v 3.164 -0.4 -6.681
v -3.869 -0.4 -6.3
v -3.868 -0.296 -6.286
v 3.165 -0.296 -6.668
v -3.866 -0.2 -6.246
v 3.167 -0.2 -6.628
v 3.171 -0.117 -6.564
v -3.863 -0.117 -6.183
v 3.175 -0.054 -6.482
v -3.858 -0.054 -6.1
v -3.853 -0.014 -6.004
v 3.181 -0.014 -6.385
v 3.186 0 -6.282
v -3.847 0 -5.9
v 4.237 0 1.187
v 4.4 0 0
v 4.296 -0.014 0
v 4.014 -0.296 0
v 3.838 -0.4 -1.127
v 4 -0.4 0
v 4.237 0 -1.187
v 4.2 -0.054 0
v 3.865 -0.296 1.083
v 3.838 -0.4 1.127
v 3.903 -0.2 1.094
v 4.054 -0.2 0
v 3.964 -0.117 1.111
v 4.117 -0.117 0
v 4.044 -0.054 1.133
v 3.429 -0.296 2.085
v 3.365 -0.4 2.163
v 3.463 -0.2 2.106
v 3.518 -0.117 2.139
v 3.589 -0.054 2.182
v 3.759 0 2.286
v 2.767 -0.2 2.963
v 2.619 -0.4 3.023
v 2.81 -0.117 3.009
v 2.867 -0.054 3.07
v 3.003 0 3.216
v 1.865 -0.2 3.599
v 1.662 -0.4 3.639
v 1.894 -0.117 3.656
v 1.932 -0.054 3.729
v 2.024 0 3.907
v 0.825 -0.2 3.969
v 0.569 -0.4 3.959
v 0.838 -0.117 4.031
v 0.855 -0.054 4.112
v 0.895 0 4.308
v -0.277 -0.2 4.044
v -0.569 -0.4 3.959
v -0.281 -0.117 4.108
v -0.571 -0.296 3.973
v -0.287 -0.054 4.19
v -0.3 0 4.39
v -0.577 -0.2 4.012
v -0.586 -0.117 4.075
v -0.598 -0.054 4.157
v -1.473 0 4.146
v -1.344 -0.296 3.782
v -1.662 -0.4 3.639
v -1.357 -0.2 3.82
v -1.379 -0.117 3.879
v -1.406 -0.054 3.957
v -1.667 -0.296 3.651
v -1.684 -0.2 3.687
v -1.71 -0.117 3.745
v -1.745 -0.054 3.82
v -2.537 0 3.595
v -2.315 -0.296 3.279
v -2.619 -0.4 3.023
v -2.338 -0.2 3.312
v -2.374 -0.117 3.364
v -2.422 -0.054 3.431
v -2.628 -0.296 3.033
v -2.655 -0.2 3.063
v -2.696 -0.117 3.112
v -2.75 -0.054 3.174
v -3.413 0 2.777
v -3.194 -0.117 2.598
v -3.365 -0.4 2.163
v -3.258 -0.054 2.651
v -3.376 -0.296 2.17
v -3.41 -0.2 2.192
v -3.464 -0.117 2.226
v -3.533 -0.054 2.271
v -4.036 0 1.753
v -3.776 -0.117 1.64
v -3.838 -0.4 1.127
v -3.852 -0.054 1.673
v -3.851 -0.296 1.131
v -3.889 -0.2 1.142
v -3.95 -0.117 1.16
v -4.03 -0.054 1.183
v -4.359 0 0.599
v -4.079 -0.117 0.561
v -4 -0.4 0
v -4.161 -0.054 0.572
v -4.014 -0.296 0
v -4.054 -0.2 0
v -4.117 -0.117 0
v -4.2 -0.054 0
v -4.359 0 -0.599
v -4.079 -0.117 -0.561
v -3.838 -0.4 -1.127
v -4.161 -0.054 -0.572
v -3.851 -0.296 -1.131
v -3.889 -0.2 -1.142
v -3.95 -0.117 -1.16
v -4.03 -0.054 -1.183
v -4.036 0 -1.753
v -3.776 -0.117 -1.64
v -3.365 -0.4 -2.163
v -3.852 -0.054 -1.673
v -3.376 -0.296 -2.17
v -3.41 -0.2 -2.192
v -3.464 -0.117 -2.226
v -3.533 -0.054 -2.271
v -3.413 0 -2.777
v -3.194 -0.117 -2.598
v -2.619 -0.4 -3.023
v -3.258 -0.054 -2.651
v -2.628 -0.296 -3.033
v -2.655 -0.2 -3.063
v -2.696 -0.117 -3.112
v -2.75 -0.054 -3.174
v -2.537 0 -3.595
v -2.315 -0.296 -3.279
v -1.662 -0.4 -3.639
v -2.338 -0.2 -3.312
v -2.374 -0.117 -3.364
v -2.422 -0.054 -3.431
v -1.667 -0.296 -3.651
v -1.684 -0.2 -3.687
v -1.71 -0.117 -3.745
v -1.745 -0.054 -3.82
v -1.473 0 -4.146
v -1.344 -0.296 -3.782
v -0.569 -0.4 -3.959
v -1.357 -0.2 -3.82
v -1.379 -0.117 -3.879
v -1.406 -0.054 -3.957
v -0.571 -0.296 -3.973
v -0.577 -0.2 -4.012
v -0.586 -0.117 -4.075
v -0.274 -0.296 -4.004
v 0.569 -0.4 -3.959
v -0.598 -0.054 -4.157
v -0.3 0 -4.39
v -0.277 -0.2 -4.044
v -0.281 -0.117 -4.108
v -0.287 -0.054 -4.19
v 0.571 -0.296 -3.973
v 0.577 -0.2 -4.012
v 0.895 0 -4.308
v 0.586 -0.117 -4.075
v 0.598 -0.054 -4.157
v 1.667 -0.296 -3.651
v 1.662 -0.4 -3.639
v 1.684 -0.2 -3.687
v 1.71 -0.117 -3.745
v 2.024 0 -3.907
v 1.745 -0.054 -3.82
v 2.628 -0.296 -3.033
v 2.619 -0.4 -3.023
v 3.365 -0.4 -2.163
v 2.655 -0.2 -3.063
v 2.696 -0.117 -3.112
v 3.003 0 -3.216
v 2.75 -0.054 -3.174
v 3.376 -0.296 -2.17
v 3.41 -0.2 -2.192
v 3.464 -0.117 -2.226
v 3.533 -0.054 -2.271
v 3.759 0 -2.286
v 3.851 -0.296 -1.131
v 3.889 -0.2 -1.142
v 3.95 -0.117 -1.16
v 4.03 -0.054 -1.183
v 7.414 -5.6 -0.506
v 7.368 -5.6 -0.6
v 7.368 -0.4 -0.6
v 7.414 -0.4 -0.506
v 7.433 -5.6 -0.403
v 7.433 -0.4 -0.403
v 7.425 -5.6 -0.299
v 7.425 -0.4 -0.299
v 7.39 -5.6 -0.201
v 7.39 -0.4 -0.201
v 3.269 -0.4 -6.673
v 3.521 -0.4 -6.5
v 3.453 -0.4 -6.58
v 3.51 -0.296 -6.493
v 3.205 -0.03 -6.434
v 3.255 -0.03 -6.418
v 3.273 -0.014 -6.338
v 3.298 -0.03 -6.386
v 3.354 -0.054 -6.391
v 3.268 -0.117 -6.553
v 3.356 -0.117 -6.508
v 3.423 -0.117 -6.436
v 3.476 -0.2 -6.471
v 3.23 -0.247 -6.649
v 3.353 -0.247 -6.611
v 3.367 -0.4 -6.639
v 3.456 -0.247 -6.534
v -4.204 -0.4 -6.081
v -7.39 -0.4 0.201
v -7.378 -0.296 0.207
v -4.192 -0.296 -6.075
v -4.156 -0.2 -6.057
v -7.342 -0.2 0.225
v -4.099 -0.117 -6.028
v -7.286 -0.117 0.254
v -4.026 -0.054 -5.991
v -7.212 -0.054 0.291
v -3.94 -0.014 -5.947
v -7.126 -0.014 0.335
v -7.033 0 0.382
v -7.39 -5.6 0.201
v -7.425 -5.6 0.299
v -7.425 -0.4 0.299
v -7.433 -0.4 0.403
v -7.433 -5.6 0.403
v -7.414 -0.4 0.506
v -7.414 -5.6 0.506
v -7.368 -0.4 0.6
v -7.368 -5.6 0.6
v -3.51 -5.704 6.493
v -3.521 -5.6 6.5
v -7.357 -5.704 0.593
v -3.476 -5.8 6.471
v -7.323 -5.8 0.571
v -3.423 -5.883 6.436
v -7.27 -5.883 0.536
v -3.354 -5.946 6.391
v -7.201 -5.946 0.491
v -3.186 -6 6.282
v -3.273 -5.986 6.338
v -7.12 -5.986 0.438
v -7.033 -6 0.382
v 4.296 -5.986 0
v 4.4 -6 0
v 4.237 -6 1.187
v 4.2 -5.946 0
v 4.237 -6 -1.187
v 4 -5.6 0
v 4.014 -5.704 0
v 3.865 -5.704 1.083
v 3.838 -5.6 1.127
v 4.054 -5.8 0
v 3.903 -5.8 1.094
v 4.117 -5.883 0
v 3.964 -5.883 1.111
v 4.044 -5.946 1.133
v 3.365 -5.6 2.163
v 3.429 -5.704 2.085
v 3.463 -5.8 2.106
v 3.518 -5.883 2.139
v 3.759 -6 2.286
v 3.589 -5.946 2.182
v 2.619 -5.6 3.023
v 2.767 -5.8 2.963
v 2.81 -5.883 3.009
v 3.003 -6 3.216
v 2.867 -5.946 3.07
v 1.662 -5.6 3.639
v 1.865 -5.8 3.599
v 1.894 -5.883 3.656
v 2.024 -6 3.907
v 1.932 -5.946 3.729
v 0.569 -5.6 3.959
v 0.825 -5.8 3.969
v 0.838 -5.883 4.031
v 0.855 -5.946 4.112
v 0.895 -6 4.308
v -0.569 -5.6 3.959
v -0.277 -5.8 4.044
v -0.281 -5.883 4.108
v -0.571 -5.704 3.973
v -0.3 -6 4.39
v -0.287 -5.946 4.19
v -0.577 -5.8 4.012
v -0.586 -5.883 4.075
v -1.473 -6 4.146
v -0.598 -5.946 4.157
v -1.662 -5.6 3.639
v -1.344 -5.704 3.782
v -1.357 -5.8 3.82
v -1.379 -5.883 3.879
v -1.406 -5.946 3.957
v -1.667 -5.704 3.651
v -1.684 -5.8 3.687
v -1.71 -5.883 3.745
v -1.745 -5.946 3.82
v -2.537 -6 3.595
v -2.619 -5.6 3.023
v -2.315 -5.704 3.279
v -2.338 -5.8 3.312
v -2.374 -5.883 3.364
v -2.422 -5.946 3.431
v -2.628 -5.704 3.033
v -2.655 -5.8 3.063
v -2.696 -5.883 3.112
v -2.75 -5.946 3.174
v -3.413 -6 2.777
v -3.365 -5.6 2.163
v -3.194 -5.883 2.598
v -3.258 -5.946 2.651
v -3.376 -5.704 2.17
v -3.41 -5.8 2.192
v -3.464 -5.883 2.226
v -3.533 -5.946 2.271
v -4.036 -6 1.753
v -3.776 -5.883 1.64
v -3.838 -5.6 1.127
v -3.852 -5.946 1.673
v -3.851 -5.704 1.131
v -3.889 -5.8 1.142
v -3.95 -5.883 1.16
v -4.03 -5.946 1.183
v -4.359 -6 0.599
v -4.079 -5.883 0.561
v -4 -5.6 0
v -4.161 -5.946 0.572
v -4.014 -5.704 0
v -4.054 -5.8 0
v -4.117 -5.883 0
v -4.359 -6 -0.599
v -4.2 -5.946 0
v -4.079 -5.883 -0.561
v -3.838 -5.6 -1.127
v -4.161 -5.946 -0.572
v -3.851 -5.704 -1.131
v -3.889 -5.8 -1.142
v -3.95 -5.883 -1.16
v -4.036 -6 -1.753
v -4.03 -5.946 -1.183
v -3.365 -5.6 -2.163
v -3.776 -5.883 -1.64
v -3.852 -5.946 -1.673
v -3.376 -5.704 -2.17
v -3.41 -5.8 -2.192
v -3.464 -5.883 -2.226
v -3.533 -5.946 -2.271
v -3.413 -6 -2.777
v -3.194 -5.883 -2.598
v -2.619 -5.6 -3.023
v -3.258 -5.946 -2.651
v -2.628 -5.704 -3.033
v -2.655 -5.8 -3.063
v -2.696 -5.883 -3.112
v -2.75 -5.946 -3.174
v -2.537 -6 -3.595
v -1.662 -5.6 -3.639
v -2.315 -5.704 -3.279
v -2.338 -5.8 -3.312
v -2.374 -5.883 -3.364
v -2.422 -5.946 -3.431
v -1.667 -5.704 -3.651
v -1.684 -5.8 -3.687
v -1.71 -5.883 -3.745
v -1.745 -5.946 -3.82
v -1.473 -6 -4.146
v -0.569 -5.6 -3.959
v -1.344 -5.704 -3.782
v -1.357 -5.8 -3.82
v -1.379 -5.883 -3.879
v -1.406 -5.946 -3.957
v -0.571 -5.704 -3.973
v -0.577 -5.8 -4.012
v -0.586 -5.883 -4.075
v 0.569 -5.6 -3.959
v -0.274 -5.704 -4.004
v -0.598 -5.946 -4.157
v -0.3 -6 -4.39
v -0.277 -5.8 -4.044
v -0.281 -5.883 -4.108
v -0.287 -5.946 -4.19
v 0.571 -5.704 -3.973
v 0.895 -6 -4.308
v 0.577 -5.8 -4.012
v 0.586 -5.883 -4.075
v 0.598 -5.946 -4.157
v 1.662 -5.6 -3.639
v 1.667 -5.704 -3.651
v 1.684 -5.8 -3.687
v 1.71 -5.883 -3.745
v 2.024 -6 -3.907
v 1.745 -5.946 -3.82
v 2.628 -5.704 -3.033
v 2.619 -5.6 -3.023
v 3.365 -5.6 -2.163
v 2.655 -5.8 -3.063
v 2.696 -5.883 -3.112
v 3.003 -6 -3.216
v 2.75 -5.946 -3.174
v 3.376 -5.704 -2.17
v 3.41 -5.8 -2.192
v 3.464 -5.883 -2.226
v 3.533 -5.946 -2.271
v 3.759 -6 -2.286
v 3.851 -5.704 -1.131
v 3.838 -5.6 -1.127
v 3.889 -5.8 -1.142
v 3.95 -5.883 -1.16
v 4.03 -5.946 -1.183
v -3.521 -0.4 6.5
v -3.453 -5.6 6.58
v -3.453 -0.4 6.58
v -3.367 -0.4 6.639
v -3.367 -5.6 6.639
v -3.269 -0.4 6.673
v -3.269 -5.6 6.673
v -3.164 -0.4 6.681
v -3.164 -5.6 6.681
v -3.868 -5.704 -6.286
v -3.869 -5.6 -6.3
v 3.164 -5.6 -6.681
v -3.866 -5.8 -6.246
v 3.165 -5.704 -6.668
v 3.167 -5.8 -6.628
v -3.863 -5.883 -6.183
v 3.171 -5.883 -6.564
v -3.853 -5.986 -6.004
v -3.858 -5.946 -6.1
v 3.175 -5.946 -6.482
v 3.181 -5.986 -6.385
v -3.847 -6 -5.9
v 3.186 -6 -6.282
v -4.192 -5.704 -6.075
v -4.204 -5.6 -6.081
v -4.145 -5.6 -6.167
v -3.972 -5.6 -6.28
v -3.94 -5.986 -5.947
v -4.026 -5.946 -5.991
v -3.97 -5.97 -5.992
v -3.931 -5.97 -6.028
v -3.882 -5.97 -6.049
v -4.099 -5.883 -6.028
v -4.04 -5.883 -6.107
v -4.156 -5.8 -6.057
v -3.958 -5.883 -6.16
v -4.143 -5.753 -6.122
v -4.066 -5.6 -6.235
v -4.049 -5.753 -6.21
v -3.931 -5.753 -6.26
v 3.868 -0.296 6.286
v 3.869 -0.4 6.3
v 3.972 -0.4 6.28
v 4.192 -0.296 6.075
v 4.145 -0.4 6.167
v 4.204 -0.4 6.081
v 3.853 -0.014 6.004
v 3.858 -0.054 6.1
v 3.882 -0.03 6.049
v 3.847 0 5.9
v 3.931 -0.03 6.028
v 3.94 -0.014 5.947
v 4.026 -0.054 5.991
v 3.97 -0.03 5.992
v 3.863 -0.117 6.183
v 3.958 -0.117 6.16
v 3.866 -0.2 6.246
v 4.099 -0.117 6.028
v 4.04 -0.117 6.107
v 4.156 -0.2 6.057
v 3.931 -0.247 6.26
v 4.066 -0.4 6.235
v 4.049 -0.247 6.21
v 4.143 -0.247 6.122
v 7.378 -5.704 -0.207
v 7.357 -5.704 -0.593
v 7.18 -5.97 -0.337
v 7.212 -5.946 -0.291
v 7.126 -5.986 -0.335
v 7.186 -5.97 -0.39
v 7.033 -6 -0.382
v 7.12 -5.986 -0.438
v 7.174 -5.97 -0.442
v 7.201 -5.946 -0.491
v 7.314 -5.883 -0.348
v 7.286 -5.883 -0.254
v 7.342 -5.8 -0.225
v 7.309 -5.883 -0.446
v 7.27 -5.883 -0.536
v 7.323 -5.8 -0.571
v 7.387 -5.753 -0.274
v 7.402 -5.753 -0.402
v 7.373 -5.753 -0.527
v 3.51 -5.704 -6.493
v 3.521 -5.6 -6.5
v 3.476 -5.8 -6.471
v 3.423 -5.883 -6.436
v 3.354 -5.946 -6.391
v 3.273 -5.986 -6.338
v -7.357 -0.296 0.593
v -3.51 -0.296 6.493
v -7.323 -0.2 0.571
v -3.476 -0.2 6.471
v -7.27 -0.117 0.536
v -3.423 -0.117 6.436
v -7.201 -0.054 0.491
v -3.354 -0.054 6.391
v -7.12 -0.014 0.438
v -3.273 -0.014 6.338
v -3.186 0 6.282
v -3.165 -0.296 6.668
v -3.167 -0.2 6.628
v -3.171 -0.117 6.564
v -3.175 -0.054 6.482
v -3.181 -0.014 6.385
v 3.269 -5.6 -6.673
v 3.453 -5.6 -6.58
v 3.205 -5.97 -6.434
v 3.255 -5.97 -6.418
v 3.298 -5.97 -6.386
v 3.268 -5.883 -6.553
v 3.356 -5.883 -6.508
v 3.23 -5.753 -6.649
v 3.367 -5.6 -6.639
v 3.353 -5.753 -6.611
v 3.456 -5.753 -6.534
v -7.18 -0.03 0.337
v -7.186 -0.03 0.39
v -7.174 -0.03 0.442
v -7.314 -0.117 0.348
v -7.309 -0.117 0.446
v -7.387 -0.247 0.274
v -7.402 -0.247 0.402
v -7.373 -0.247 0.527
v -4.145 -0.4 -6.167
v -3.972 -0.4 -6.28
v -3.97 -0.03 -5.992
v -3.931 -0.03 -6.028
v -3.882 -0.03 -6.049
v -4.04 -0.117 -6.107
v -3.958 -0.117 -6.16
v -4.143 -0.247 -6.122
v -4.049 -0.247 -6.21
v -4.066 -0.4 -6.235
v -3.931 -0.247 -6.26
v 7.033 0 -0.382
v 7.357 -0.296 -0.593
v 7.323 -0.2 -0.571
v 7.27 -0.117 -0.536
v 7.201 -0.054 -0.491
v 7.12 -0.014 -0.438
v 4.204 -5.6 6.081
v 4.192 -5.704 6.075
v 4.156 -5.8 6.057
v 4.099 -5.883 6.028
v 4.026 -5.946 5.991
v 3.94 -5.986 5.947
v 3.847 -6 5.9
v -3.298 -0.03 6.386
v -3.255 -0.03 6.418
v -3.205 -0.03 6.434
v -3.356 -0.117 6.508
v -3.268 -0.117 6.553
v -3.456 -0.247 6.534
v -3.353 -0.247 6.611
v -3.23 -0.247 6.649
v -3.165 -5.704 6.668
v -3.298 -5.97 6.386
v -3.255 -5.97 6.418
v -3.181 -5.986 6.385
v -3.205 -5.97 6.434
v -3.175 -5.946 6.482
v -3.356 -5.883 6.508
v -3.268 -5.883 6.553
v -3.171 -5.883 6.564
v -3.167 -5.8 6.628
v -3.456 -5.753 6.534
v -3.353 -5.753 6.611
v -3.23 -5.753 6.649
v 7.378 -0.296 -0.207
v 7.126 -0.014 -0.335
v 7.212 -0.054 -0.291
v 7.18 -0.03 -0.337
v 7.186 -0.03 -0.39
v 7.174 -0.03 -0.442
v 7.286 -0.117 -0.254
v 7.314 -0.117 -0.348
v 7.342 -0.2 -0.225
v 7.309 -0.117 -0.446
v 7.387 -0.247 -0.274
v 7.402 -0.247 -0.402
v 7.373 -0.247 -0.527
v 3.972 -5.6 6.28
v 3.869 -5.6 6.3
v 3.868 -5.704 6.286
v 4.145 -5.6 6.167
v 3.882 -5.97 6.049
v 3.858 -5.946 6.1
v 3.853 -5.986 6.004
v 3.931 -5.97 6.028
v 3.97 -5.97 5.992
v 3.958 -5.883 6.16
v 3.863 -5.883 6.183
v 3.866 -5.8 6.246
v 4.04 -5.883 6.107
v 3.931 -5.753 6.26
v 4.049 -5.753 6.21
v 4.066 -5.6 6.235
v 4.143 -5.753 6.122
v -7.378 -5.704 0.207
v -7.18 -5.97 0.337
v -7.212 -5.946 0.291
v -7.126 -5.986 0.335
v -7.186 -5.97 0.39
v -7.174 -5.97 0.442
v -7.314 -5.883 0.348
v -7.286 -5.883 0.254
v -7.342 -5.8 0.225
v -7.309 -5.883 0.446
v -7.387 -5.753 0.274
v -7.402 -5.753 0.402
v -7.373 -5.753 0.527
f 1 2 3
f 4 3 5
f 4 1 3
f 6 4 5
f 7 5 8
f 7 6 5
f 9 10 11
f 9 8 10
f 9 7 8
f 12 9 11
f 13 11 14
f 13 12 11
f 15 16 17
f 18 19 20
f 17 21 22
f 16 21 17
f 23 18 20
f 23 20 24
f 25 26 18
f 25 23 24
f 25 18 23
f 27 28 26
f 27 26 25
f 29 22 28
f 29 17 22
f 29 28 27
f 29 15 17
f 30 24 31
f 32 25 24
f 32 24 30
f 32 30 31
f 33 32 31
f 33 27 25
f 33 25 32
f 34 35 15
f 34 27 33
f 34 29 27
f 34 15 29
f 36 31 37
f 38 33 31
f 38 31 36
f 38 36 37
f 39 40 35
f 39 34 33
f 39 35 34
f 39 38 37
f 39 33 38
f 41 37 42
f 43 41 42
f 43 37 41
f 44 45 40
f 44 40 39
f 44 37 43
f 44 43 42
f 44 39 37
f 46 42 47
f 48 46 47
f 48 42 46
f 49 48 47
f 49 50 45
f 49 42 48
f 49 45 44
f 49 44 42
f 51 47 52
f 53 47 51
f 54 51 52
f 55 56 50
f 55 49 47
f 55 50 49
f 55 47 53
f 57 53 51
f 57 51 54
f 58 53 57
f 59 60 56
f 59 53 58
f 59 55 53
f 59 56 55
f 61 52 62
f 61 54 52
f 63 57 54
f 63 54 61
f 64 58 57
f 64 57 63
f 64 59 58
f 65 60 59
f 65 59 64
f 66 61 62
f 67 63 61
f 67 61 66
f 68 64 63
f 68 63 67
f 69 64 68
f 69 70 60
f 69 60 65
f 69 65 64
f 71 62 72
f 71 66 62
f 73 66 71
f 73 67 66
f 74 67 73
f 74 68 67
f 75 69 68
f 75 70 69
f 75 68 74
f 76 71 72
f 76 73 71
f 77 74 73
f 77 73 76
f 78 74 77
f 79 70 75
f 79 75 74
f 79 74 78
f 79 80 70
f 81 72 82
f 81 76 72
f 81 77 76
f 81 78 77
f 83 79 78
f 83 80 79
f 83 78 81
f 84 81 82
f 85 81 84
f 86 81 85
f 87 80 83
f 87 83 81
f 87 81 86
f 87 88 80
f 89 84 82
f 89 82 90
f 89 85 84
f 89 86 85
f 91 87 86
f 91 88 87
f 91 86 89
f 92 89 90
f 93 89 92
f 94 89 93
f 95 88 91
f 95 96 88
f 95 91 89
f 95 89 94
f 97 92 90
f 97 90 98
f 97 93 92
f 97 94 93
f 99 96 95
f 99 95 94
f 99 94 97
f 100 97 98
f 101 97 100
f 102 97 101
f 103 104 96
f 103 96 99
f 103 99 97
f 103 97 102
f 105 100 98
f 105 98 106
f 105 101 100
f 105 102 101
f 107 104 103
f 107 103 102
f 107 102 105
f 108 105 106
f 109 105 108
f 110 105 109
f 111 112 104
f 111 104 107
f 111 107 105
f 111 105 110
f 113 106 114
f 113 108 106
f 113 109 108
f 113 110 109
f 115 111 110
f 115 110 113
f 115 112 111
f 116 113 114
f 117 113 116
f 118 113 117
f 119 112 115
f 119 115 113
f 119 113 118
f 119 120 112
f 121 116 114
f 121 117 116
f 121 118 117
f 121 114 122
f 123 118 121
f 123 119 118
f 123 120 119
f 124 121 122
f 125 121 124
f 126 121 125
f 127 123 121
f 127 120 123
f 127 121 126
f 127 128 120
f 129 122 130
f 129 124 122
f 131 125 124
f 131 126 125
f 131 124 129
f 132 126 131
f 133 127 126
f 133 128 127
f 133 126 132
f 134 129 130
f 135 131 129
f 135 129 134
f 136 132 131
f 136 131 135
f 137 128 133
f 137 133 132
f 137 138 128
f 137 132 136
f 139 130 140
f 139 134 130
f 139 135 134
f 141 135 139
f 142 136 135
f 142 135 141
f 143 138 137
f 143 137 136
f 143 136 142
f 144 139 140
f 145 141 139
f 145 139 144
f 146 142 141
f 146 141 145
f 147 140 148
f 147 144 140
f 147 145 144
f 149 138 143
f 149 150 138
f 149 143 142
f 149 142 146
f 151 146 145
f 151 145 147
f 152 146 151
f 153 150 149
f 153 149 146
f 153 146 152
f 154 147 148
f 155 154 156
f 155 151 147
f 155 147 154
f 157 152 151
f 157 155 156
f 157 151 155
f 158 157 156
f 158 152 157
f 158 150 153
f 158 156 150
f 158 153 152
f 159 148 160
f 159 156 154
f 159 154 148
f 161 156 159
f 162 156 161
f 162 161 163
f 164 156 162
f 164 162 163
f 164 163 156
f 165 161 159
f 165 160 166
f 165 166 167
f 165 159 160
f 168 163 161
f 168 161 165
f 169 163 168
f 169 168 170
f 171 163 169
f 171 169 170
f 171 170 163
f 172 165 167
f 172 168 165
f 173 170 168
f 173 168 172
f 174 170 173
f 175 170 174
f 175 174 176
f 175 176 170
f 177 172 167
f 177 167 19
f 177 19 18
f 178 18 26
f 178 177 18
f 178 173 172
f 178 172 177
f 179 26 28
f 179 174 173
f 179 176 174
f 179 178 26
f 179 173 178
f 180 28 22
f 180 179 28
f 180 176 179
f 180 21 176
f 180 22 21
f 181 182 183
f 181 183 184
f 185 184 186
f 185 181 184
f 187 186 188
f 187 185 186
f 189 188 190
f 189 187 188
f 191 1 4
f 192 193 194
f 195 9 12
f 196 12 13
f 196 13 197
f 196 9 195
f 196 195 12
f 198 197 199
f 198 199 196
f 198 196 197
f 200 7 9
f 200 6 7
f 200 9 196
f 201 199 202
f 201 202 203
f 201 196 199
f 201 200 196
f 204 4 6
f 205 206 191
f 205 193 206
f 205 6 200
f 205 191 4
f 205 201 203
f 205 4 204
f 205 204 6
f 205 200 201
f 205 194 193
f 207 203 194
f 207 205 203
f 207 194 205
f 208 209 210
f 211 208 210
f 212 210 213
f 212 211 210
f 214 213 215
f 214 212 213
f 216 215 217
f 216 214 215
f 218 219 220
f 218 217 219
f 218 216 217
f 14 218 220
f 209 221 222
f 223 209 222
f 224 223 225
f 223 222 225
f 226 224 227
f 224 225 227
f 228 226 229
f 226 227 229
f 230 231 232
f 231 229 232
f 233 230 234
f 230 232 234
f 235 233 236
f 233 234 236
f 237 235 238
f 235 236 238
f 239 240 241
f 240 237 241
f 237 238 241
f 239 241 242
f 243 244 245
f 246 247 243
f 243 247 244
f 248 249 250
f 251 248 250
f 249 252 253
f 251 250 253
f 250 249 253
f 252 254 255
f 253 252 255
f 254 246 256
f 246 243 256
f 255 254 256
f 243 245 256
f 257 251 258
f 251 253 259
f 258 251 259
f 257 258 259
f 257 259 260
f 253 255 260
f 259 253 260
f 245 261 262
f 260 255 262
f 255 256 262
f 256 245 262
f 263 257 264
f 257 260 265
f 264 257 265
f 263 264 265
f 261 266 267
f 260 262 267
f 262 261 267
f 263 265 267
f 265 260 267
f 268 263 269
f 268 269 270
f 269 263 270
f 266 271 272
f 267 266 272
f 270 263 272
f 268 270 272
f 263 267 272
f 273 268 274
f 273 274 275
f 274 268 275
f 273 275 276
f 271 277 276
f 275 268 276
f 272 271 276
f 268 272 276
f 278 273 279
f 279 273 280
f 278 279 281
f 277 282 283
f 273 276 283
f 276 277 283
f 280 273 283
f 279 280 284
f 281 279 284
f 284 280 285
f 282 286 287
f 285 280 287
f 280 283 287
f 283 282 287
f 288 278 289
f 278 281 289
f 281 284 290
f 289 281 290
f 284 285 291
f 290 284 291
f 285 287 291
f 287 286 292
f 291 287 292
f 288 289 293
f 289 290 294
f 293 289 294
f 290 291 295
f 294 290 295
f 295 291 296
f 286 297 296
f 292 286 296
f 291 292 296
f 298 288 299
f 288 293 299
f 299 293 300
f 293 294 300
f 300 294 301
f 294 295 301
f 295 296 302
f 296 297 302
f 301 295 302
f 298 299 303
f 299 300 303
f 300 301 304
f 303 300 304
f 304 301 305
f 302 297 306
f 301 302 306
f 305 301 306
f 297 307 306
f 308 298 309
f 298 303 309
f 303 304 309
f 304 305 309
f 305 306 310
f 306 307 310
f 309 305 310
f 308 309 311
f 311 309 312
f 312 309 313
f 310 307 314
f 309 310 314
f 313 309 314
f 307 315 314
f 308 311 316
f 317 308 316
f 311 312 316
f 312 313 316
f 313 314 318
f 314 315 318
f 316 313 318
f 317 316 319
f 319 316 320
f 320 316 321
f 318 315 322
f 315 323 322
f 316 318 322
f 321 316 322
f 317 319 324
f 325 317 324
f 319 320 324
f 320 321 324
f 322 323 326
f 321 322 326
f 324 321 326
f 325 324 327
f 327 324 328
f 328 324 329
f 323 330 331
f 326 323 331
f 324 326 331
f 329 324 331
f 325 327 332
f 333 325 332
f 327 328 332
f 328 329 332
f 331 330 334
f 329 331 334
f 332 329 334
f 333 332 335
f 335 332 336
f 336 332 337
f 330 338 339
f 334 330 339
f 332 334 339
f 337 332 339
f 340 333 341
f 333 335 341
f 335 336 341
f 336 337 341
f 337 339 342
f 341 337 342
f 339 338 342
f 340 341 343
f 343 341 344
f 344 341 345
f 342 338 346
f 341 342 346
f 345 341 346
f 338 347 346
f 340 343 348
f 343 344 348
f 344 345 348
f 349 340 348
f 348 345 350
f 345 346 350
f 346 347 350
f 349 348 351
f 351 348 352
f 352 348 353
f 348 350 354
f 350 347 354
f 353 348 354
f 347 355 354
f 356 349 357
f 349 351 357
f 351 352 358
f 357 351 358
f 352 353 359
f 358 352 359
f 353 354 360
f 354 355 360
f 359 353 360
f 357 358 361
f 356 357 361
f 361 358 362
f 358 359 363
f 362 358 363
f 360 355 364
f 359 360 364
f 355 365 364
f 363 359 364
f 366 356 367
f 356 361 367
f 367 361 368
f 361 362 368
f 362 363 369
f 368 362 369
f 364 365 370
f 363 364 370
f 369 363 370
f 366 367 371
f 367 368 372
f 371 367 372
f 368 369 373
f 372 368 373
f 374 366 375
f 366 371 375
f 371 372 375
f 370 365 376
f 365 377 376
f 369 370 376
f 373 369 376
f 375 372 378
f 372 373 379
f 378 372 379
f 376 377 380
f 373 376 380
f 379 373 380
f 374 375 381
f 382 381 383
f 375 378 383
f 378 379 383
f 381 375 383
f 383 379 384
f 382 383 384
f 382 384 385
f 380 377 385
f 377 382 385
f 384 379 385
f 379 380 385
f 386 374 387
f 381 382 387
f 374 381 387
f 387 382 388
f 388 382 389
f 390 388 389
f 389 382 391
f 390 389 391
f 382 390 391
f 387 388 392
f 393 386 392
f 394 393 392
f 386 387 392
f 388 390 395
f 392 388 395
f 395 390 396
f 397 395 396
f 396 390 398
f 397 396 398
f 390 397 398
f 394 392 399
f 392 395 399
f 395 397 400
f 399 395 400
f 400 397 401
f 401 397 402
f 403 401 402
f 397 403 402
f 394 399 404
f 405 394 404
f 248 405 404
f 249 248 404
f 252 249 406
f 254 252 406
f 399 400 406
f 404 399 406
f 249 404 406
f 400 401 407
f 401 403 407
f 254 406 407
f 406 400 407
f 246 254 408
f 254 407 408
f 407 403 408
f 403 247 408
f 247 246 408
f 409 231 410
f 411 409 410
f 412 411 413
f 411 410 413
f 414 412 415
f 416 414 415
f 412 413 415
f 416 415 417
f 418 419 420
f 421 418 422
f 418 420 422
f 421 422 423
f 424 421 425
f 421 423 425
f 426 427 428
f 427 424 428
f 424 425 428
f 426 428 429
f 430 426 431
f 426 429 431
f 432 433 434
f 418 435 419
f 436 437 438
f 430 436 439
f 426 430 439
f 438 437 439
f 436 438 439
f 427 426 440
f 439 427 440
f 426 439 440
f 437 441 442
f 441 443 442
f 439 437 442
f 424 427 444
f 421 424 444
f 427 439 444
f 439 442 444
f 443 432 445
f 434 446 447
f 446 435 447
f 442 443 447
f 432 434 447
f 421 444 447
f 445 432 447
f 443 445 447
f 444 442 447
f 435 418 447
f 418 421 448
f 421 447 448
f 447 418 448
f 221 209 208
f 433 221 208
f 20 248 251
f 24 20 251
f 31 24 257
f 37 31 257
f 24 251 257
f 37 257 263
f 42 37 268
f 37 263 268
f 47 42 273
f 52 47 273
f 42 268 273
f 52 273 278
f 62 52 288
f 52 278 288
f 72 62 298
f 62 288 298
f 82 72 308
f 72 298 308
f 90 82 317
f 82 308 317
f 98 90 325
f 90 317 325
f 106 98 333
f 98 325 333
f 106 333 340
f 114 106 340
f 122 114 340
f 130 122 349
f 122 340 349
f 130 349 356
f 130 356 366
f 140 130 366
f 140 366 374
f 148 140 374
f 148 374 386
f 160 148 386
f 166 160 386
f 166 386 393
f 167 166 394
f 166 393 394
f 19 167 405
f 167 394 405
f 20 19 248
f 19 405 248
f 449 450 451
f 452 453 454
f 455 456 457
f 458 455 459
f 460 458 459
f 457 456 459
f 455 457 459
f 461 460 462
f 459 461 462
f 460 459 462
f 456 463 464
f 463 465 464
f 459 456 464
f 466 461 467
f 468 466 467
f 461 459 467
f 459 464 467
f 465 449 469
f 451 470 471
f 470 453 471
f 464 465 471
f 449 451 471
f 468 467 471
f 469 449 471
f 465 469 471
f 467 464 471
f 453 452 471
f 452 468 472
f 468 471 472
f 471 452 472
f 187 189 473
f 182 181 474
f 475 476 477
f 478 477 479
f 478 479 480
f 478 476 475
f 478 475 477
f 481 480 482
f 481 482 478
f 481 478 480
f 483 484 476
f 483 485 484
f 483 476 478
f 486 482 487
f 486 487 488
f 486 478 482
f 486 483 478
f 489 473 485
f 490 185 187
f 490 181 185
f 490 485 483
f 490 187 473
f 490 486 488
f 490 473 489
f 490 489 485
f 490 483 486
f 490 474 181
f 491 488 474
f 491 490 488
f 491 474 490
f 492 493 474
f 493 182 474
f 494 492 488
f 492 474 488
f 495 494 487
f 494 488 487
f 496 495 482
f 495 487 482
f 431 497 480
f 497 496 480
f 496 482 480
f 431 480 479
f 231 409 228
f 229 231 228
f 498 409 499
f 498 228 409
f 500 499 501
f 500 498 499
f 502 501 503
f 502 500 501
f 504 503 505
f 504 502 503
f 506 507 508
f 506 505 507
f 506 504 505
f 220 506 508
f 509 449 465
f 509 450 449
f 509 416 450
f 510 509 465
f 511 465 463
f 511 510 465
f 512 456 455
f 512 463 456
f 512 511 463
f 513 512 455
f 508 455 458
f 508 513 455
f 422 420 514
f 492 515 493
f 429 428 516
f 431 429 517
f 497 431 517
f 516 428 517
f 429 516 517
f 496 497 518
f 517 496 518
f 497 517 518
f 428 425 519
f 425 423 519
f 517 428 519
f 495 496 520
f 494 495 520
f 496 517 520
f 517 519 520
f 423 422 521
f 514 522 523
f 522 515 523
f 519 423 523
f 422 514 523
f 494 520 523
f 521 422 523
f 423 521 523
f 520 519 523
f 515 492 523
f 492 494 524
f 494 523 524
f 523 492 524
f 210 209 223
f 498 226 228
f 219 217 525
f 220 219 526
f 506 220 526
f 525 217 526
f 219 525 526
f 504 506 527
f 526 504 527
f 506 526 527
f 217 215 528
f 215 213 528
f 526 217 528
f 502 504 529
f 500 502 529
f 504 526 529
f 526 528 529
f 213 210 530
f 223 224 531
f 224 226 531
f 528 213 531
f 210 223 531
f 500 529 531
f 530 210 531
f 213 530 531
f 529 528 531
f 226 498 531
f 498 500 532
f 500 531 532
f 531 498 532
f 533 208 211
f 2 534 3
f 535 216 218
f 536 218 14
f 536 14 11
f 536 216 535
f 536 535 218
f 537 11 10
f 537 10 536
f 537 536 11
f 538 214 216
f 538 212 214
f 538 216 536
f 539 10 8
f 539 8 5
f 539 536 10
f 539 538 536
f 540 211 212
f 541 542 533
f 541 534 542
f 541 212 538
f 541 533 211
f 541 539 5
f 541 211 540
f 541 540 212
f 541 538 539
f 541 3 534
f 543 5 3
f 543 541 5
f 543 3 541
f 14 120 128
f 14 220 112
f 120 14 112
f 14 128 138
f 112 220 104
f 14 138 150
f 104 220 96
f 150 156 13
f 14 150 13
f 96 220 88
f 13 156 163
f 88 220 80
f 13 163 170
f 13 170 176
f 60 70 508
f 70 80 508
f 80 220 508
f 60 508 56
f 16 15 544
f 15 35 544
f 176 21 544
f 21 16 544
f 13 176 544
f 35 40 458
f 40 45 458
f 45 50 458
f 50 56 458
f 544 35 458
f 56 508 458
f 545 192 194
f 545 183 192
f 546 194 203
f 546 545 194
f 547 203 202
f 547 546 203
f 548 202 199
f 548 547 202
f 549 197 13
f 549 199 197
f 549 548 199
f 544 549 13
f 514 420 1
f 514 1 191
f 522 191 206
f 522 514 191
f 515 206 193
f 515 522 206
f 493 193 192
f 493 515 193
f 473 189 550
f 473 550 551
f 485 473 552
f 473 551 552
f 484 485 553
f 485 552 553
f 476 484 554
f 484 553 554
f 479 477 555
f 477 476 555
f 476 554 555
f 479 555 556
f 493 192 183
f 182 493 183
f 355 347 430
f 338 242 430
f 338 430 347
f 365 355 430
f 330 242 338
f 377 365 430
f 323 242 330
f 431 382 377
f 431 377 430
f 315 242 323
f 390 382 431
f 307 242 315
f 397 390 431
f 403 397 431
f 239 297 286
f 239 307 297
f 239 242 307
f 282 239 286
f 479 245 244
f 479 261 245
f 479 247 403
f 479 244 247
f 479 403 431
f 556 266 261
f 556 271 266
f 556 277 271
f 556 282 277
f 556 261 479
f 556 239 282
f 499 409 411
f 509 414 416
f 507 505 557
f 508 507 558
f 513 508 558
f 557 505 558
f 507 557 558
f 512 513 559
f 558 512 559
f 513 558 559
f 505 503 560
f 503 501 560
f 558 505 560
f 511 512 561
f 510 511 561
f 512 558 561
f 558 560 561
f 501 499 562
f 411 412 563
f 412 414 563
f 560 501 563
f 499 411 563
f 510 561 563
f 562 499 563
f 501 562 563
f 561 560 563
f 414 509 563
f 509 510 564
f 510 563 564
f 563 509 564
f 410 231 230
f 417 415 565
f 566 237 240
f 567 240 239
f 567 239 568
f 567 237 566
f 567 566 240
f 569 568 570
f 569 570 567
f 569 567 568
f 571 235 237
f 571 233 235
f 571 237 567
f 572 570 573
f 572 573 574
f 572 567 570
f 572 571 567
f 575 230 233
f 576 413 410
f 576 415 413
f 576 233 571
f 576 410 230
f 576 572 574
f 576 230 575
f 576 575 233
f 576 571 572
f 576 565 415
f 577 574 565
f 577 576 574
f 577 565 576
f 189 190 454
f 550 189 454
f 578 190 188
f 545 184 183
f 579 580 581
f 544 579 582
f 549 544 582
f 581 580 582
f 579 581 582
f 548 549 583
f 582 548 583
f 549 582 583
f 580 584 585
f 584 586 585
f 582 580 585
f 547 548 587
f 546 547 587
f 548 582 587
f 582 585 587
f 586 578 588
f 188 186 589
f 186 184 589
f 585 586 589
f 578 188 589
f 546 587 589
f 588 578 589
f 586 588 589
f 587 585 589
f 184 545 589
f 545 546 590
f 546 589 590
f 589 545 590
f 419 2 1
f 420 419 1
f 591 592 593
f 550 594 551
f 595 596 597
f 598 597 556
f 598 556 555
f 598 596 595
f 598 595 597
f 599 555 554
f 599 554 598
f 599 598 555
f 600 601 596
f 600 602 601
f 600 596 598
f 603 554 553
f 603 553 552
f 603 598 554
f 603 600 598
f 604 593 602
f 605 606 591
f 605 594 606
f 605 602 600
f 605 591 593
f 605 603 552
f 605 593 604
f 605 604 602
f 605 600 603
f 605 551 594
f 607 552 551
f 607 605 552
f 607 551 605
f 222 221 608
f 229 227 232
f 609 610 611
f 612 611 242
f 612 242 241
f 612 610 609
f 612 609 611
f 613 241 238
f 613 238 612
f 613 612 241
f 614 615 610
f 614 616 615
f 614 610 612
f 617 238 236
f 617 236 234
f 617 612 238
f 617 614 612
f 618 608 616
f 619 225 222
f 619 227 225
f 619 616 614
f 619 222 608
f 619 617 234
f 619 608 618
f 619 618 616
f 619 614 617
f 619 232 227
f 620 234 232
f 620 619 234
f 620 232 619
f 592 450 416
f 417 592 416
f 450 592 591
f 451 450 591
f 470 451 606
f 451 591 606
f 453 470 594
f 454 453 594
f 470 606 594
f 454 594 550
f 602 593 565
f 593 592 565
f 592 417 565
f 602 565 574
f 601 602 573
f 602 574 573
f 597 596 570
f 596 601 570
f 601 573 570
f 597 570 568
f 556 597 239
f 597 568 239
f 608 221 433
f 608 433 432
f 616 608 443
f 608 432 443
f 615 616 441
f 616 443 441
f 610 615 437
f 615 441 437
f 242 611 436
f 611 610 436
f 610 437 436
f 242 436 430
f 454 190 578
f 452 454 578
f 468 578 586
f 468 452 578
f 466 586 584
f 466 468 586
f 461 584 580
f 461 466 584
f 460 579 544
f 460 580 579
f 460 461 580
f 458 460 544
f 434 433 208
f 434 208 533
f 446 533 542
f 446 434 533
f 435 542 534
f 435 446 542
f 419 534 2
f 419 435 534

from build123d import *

# Parameters (mm, degrees)
F1_DEPTH = 6
F2_R     = 4
F3_DEPTH = 6
F4_R     = 0.4


with BuildPart() as f1:
    # F0 (on Front) → F1 (new body)
    with BuildSketch(Plane.XZ):
        Polygon((3.3950570152, -6.6937972181), (7.4945269462, -0.4066929865), (4.099469931, 6.2871042315), (-3.3950570152, 6.6937972181), (-7.4945269462, 0.4066929865), (-4.099469931, -6.2871042315), align=None)
    extrude(amount=F1_DEPTH)

    # F2 (on face) → F3 (intersect)
    with BuildSketch(Plane.XZ.offset(6)):
        Polygon((-7.4945269462, 0.4066929865), (-4.099469931, -6.2871042315), (3.3950570152, -6.6937972181), (7.4945269462, -0.4066929865), (4.099469931, 6.2871042315), (-3.3950570152, 6.6937972181), align=None)
        Circle(F2_R, mode=Mode.SUBTRACT)
    extrude(amount=-F3_DEPTH, mode=Mode.INTERSECT)

    # F4
    f4_edges = [f1.edges().sort_by_distance(p)[0] for p in [
        (-7.494527, -3, 0.406693),
        (-4.09947, -3, -6.287104),
        (-5.796998, 0, -2.940206),
        (-5.796998, -6, -2.940206),
        (3.395057, -3, -6.693797),
        (-0.352206, 0, -6.490451),
        (-0.352206, -6, -6.490451),
        (-3.395057, -3, 6.693797),
        (-5.444792, 0, 3.550245),
        (-5.444792, -6, 3.550245),
        (4.09947, -3, 6.287104),
        (0.352206, 0, 6.490451),
        (0.352206, -6, 6.490451),
        (7.494527, -3, -0.406693),
        (5.796998, 0, 2.940206),
        (5.796998, -6, 2.940206),
        (5.444792, 0, -3.550245),
        (5.444792, -6, -3.550245),
        (-4, -6, 0),
        (-4, 0, 0),
    ]]
    fillet(f4_edges, radius=F4_R)


solid = f1.part
